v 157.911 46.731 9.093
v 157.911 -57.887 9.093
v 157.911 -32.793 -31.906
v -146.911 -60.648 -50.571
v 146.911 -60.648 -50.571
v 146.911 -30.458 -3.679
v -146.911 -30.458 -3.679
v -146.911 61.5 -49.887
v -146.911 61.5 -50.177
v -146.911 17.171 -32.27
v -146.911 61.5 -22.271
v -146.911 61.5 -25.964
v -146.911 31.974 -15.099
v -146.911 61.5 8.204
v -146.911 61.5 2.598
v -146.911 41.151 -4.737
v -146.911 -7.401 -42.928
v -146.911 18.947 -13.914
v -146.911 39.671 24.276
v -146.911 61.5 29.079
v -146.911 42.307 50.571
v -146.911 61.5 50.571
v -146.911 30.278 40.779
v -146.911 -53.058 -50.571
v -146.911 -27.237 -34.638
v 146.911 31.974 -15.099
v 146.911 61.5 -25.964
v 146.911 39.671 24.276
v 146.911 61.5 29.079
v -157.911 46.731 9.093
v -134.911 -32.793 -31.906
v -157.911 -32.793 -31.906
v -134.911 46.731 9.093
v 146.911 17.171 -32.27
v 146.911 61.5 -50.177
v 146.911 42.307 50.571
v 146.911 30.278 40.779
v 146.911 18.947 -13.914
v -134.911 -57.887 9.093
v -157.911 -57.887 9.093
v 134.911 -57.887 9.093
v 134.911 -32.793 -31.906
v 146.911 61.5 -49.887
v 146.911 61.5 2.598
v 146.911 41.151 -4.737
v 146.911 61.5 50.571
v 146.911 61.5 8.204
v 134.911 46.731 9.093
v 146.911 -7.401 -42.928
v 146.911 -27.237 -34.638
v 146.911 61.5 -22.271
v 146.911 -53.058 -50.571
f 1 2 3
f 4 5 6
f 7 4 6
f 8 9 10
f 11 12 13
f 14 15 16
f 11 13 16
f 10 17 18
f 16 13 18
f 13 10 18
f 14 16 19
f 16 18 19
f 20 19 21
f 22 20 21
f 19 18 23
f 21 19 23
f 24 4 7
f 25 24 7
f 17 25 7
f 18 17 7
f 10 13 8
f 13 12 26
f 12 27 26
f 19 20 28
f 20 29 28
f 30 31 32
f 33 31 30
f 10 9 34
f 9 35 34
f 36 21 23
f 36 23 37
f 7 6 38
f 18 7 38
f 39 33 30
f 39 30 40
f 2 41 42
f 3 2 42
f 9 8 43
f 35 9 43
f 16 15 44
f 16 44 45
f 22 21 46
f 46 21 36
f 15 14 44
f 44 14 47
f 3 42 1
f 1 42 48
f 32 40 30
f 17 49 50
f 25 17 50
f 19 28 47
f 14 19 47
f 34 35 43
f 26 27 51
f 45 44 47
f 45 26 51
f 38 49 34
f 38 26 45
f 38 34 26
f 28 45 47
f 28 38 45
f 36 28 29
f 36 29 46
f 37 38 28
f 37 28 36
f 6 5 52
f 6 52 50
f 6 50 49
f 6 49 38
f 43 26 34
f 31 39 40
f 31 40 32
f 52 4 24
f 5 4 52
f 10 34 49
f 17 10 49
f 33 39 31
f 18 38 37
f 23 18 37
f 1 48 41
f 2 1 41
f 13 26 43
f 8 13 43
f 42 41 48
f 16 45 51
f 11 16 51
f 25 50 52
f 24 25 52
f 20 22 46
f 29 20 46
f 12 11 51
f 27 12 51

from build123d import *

# Parameters (mm, degrees)
F0_W          = 293.8216626644
F0_H          = 101.1411622167
F1_DEPTH      = 61.5
F4_DEPTH      = 334
F6_DEPTH      = 12
F6_DEPTH_BACK = 11
F8_SIZE       = 10
F10_DEPTH     = 185


with BuildPart() as f1:
    # F0 (on Front) → F1 (new body, symmetric)
    with BuildSketch(Plane.XZ):
        Rectangle(F0_W, F0_H)
    extrude(amount=F1_DEPTH, both=True)

    # F3 (on face) → F4 (cut)
    with BuildSketch(Plane.YZ.offset(146.9108313322)):
        Polygon((18.9473703504, -13.9144742861), (34.342110157, 60.3947378695), (-66.0197362304, 65.4276311398), (-66.0197362304, -58.914475143), (-30.4582760151, -3.6790398264), align=None)
    extrude(amount=-F4_DEPTH, mode=Mode.SUBTRACT)

    # F7: F1 across plane


with BuildPart() as f6:
    # F5 (on face) → F6 (new body, two sides)
    with BuildSketch(Plane.YZ.offset(146.9108313322)) as f6_sk:
        Polygon((-57.8868165612, 9.0928608552), (-32.7925831079, -31.9061651826), (46.7313863337, 9.0928608552), align=None)
    extrude(amount=-F6_DEPTH)
    extrude(f6_sk.sketch, amount=F6_DEPTH_BACK)


with BuildPart() as f1_1:
    add(f1.part)
    add(f1.part.mirror(Plane.YZ))

    # F8
    f8_edges = [f1_1.edges().sort_by_distance(p)[0] for p in [
        (0, 32.306826, 50.570581),
    ]]
    chamfer(f8_edges, length=F8_SIZE)

    # F9 (on Right) → F10 (cut, symmetric)
    with BuildSketch(Plane.YZ):
        Polygon((78.7500068545, -65.2264166398), (69.2763254046, 30.7894740254), (39.6710522473, 24.2763161659), (66.6118487716, 4.4407895766), (41.1513186991, -4.7368425876), (68.980269134, -28.7171080709), (31.9736860693, -15.0986844674), (61.8749968708, -50.328951329), (17.1710532159, -32.2697386146), (-7.4013168924, -42.927633971), (-27.236841619, -34.638158977), (-55.0657920539, -51.8092103302), (-46.7870918171, -65.2264166398), align=None)
    extrude(amount=F10_DEPTH, both=True, mode=Mode.SUBTRACT)


with BuildPart() as f11_1:
    # F11: instance of F6
    add(f6.part.mirror(Plane.YZ))


solid = Compound([f6.part, f1_1.part, f11_1.part])
